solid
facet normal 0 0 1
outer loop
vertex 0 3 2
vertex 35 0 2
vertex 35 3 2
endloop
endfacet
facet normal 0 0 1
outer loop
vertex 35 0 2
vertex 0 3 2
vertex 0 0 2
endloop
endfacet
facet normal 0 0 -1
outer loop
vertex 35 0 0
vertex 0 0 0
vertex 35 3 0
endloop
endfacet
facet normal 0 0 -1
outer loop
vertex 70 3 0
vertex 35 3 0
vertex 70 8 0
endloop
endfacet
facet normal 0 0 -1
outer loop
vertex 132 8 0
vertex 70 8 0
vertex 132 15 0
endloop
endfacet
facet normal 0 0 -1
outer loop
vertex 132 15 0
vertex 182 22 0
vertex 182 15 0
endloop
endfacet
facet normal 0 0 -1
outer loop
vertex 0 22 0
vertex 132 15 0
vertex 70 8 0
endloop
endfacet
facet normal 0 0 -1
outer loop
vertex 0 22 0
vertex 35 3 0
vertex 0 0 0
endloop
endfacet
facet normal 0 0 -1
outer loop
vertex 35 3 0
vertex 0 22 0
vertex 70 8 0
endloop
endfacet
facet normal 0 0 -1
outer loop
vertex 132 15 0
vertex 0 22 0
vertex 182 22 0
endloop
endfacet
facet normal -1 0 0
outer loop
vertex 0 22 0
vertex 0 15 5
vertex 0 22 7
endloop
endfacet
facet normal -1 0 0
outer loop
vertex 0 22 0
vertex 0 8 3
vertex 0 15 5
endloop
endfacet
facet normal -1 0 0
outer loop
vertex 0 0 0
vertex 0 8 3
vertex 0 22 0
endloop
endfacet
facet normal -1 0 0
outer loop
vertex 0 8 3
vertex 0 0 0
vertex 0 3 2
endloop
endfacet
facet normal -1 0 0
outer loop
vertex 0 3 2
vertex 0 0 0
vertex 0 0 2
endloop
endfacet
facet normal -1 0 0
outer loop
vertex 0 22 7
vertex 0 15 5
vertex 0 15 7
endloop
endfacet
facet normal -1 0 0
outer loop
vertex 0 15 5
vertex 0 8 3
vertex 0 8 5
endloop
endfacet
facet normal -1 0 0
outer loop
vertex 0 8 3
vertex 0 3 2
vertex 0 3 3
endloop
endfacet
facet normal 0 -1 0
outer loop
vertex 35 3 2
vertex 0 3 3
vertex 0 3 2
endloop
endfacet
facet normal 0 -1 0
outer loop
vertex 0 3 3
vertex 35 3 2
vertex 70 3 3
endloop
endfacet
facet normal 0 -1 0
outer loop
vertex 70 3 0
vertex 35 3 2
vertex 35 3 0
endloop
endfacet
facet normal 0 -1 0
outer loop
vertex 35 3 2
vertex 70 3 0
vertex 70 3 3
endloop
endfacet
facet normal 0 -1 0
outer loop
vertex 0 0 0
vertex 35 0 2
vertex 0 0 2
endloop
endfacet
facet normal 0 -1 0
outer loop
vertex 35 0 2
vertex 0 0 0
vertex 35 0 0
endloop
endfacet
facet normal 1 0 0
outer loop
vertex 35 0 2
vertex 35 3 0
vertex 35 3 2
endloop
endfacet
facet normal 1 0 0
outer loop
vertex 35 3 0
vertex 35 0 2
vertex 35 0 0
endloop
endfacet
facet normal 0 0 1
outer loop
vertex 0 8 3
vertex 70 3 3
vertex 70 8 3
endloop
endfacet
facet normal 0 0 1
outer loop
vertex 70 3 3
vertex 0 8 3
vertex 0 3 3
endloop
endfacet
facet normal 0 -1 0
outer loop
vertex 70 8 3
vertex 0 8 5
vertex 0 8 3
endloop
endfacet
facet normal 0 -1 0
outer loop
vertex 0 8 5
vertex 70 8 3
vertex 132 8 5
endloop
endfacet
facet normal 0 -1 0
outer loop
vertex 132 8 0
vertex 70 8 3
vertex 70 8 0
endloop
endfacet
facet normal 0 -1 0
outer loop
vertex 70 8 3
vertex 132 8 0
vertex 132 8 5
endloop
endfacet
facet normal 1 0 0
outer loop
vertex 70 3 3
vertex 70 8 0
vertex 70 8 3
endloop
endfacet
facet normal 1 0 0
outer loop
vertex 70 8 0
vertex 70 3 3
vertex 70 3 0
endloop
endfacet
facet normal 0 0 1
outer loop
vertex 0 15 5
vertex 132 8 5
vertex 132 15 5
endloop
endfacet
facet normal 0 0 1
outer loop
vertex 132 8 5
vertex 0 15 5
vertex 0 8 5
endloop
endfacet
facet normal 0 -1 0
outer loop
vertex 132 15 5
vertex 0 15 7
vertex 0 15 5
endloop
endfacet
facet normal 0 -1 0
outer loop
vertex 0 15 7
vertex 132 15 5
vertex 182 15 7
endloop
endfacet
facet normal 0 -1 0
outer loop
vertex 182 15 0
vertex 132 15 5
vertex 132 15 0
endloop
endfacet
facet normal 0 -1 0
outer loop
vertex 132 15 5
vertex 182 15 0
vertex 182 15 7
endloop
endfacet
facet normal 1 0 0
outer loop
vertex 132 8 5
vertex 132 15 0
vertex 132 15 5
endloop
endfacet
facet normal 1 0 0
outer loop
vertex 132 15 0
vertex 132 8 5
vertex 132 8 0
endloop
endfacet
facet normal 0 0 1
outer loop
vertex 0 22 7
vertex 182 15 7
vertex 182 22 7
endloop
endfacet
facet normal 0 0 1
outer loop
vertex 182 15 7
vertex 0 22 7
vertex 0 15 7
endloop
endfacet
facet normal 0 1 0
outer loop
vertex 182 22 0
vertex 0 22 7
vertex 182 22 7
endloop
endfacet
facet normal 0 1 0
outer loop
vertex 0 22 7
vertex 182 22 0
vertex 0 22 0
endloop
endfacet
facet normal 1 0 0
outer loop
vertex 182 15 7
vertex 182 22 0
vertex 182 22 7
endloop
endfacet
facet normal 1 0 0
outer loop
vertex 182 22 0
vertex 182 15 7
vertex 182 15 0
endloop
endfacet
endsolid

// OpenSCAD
translate([2.5, 1.5, 1.0]) color([0.3285207100154869, 0.4147216089714424, 0.09940033823870109]) cube([5, 3, 2], center=true);
translate([7.5, 1.5, 1.0]) color([0.9086575543967805, 0.4740046511372964, 0.8408483326276716]) cube([5, 3, 2], center=true);
translate([12.5, 1.5, 1.0]) color([0.976229457649057, 0.34365159365776776, 0.4790865191519861]) cube([5, 3, 2], center=true);
translate([17.5, 1.5, 1.0]) color([0.6995952911506185, 0.42653532354402823, 0.30190311621935595]) cube([5, 3, 2], center=true);
translate([22.5, 1.5, 1.0]) color([0.7347509912186152, 0.8943997782145745, 0.9196888444316101]) cube([5, 3, 2], center=true);
translate([27.5, 1.5, 1.0]) color([0.6267420468068673, 0.3755713463285453, 0.9745605214796941]) cube([5, 3, 2], center=true);
translate([32.5, 1.5, 1.0]) color([0.6388785175004733, 0.06583467727730097, 0.08466956912011114]) cube([5, 3, 2], center=true);
translate([3.5, 5.5, 1.5]) color([0.749869571783086, 0.06115615654596607, 0.007851005331251826]) cube([7, 5, 3], center=true);
translate([10.5, 5.5, 1.5]) color([0.39380795178170946, 0.5190037287013293, 0.44854428559655457]) cube([7, 5, 3], center=true);
translate([17.5, 5.5, 1.5]) color([0.48861880442715255, 0.5848887019932744, 0.6793025673721249]) cube([7, 5, 3], center=true);
translate([24.5, 5.5, 1.5]) color([0.4230380735074225, 0.3683314563344259, 0.9884590580992895]) cube([7, 5, 3], center=true);
translate([31.5, 5.5, 1.5]) color([0.26091653544625626, 0.7771001545085096, 0.43122102463204415]) cube([7, 5, 3], center=true);
translate([38.5, 5.5, 1.5]) color([0.35852038200953895, 0.06385794894382868, 0.8635789443020424]) cube([7, 5, 3], center=true);
translate([45.5, 5.5, 1.5]) color([0.7020041497619371, 0.9030107075409272, 0.4516117926868677]) cube([7, 5, 3], center=true);
translate([52.5, 5.5, 1.5]) color([0.6769209668166035, 0.11891028655385572, 0.3979536016023134]) cube([7, 5, 3], center=true);
translate([59.5, 5.5, 1.5]) color([0.20723197341708288, 0.04210142789066196, 0.94796135125632]) cube([7, 5, 3], center=true);
translate([66.5, 5.5, 1.5]) color([0.21589436846535714, 0.1463544898080057, 0.19797004355794223]) cube([7, 5, 3], center=true);
translate([5.5, 11.5, 2.5]) color([0.37803196431429753, 0.5463912623151137, 0.15133436847289106]) cube([11, 7, 5], center=true);
translate([16.5, 11.5, 2.5]) color([0.9886898889857565, 0.9829892105452821, 0.14840201708602985]) cube([11, 7, 5], center=true);
translate([27.5, 11.5, 2.5]) color([0.4059068831679489, 0.6799294831100022, 0.8776565829010952]) cube([11, 7, 5], center=true);
translate([38.5, 11.5, 2.5]) color([0.49540592491118873, 0.9170466727598151, 0.3224603148813061]) cube([11, 7, 5], center=true);
translate([49.5, 11.5, 2.5]) color([0.4984408914907503, 0.4986465918650089, 0.6700681513152942]) cube([11, 7, 5], center=true);
translate([60.5, 11.5, 2.5]) color([0.2019913087994536, 0.6097706104167804, 0.21877309687215574]) cube([11, 7, 5], center=true);
translate([71.5, 11.5, 2.5]) color([0.340220315051032, 0.9625664632546818, 0.8990080380310076]) cube([11, 7, 5], center=true);
translate([82.5, 11.5, 2.5]) color([0.8181183809177941, 0.035468261876012264, 0.14836688246192975]) cube([11, 7, 5], center=true);
translate([93.5, 11.5, 2.5]) color([0.2568819120719038, 0.7841665681891542, 0.8423333270773672]) cube([11, 7, 5], center=true);
translate([104.5, 11.5, 2.5]) color([0.5829481802462215, 0.7181316517768294, 0.8070553799750758]) cube([11, 7, 5], center=true);
translate([115.5, 11.5, 2.5]) color([0.06635913103778524, 0.08464313683307012, 0.8688953140043785]) cube([11, 7, 5], center=true);
translate([126.5, 11.5, 2.5]) color([0.03941582937802879, 0.22509065367649606, 0.04063202664590093]) cube([11, 7, 5], center=true);
translate([6.5, 18.5, 3.5]) color([0.015285139969726802, 0.8439546856924078, 0.3305943672500803]) cube([13, 7, 7], center=true);
translate([19.5, 18.5, 3.5]) color([0.1606900602627206, 0.1488194902889095, 0.656083661770337]) cube([13, 7, 7], center=true);
translate([32.5, 18.5, 3.5]) color([0.9685982716927071, 0.5049996926056783, 0.9010904768840049]) cube([13, 7, 7], center=true);
translate([45.5, 18.5, 3.5]) color([0.5024285989524275, 0.5738724774915492, 0.6785713567893591]) cube([13, 7, 7], center=true);
translate([58.5, 18.5, 3.5]) color([0.805109989032137, 0.7578463822613826, 0.9905325627055622]) cube([13, 7, 7], center=true);
translate([71.5, 18.5, 3.5]) color([0.7469653891501328, 0.9057807233528663, 0.20610483206558328]) cube([13, 7, 7], center=true);
translate([84.5, 18.5, 3.5]) color([0.535416304328581, 0.5986142636674691, 0.8256966171603538]) cube([13, 7, 7], center=true);
translate([97.5, 18.5, 3.5]) color([0.4822135630659161, 0.7910402117090956, 0.3885688901501142]) cube([13, 7, 7], center=true);
translate([110.5, 18.5, 3.5]) color([0.5863884555814496, 0.8513166074810679, 0.7980594711041583]) cube([13, 7, 7], center=true);
translate([123.5, 18.5, 3.5]) color([0.6569845518861341, 0.00024069652516689466, 0.18196892218621108]) cube([13, 7, 7], center=true);
translate([136.5, 18.5, 3.5]) color([0.5068577868511277, 0.2544593984833793, 0.06562084327273077]) cube([13, 7, 7], center=true);
translate([149.5, 18.5, 3.5]) color([0.8598834221214616, 0.9429470213131631, 0.3028048781490337]) cube([13, 7, 7], center=true);
translate([162.5, 18.5, 3.5]) color([0.40807316738486077, 0.8100375338172869, 0.06225875887122312]) cube([13, 7, 7], center=true);
translate([175.5, 18.5, 3.5]) color([0.6409848625624502, 0.12732081293278708, 0.2870883399952252]) cube([13, 7, 7], center=true);
